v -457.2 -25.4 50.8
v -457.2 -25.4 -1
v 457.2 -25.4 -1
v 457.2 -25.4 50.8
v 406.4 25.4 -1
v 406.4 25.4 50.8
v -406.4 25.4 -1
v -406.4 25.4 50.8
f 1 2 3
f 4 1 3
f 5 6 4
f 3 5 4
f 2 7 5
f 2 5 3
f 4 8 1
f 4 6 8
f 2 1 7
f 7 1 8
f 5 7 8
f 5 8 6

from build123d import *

# Parameters (mm, degrees)
SALIENTE_EXTRUIR1_DEPTH      = 50.8
SALIENTE_EXTRUIR1_DEPTH_BACK = 1
CROQUIS1_W                   = 914.4
CROQUIS1_H                   = 50.8
CORTAR_EXTRUIR2_DEPTH        = 461.825606927
CORTAR_EXTRUIR3_DEPTH        = 461.825606927
CORTAR_EXTRUIR4_DEPTH        = 461.825606927


with BuildPart() as part:
    # Croquis1 → Saliente-Extruir1 (new, two sides: drawn at the far end of the back side and taken through both)
    with BuildSketch(Plane.XY.offset(-SALIENTE_EXTRUIR1_DEPTH_BACK)):
        Rectangle(CROQUIS1_W, CROQUIS1_H)
    extrude(amount=SALIENTE_EXTRUIR1_DEPTH + SALIENTE_EXTRUIR1_DEPTH_BACK)

    # Croquis3 → Cortar-Extruir2 (cut, through all)
    with BuildSketch(Plane.XY.offset(50.8)):
        Polygon((-437.2, 25.4), (-457.2, 25.4), (-457.2, -25.4), align=None)
    extrude(amount=-CORTAR_EXTRUIR2_DEPTH, mode=Mode.SUBTRACT)

    # Croquis4 → Cortar-Extruir3 (cut, through all)
    with BuildSketch(Plane(origin=(0, 0, -1), x_dir=(-1, 0, 0), z_dir=(0, 0, -1))):
        Polygon((-437.2, 25.4), (-457.2, 25.4), (-457.2, -25.4), align=None)
    extrude(amount=-CORTAR_EXTRUIR3_DEPTH, mode=Mode.SUBTRACT)

    # Croquis6 → Cortar-Extruir4 (cut, through all)
    with BuildSketch(Plane.XY.offset(50.8)):
        Polygon((-437.2, 25.4), (-457.2, -25.4), (-406.4, 25.4), align=None)
        Polygon((437.2, 25.4), (406.4, 25.4), (457.2, -25.4), align=None)
    extrude(amount=-CORTAR_EXTRUIR4_DEPTH, mode=Mode.SUBTRACT)


solid = part.part
